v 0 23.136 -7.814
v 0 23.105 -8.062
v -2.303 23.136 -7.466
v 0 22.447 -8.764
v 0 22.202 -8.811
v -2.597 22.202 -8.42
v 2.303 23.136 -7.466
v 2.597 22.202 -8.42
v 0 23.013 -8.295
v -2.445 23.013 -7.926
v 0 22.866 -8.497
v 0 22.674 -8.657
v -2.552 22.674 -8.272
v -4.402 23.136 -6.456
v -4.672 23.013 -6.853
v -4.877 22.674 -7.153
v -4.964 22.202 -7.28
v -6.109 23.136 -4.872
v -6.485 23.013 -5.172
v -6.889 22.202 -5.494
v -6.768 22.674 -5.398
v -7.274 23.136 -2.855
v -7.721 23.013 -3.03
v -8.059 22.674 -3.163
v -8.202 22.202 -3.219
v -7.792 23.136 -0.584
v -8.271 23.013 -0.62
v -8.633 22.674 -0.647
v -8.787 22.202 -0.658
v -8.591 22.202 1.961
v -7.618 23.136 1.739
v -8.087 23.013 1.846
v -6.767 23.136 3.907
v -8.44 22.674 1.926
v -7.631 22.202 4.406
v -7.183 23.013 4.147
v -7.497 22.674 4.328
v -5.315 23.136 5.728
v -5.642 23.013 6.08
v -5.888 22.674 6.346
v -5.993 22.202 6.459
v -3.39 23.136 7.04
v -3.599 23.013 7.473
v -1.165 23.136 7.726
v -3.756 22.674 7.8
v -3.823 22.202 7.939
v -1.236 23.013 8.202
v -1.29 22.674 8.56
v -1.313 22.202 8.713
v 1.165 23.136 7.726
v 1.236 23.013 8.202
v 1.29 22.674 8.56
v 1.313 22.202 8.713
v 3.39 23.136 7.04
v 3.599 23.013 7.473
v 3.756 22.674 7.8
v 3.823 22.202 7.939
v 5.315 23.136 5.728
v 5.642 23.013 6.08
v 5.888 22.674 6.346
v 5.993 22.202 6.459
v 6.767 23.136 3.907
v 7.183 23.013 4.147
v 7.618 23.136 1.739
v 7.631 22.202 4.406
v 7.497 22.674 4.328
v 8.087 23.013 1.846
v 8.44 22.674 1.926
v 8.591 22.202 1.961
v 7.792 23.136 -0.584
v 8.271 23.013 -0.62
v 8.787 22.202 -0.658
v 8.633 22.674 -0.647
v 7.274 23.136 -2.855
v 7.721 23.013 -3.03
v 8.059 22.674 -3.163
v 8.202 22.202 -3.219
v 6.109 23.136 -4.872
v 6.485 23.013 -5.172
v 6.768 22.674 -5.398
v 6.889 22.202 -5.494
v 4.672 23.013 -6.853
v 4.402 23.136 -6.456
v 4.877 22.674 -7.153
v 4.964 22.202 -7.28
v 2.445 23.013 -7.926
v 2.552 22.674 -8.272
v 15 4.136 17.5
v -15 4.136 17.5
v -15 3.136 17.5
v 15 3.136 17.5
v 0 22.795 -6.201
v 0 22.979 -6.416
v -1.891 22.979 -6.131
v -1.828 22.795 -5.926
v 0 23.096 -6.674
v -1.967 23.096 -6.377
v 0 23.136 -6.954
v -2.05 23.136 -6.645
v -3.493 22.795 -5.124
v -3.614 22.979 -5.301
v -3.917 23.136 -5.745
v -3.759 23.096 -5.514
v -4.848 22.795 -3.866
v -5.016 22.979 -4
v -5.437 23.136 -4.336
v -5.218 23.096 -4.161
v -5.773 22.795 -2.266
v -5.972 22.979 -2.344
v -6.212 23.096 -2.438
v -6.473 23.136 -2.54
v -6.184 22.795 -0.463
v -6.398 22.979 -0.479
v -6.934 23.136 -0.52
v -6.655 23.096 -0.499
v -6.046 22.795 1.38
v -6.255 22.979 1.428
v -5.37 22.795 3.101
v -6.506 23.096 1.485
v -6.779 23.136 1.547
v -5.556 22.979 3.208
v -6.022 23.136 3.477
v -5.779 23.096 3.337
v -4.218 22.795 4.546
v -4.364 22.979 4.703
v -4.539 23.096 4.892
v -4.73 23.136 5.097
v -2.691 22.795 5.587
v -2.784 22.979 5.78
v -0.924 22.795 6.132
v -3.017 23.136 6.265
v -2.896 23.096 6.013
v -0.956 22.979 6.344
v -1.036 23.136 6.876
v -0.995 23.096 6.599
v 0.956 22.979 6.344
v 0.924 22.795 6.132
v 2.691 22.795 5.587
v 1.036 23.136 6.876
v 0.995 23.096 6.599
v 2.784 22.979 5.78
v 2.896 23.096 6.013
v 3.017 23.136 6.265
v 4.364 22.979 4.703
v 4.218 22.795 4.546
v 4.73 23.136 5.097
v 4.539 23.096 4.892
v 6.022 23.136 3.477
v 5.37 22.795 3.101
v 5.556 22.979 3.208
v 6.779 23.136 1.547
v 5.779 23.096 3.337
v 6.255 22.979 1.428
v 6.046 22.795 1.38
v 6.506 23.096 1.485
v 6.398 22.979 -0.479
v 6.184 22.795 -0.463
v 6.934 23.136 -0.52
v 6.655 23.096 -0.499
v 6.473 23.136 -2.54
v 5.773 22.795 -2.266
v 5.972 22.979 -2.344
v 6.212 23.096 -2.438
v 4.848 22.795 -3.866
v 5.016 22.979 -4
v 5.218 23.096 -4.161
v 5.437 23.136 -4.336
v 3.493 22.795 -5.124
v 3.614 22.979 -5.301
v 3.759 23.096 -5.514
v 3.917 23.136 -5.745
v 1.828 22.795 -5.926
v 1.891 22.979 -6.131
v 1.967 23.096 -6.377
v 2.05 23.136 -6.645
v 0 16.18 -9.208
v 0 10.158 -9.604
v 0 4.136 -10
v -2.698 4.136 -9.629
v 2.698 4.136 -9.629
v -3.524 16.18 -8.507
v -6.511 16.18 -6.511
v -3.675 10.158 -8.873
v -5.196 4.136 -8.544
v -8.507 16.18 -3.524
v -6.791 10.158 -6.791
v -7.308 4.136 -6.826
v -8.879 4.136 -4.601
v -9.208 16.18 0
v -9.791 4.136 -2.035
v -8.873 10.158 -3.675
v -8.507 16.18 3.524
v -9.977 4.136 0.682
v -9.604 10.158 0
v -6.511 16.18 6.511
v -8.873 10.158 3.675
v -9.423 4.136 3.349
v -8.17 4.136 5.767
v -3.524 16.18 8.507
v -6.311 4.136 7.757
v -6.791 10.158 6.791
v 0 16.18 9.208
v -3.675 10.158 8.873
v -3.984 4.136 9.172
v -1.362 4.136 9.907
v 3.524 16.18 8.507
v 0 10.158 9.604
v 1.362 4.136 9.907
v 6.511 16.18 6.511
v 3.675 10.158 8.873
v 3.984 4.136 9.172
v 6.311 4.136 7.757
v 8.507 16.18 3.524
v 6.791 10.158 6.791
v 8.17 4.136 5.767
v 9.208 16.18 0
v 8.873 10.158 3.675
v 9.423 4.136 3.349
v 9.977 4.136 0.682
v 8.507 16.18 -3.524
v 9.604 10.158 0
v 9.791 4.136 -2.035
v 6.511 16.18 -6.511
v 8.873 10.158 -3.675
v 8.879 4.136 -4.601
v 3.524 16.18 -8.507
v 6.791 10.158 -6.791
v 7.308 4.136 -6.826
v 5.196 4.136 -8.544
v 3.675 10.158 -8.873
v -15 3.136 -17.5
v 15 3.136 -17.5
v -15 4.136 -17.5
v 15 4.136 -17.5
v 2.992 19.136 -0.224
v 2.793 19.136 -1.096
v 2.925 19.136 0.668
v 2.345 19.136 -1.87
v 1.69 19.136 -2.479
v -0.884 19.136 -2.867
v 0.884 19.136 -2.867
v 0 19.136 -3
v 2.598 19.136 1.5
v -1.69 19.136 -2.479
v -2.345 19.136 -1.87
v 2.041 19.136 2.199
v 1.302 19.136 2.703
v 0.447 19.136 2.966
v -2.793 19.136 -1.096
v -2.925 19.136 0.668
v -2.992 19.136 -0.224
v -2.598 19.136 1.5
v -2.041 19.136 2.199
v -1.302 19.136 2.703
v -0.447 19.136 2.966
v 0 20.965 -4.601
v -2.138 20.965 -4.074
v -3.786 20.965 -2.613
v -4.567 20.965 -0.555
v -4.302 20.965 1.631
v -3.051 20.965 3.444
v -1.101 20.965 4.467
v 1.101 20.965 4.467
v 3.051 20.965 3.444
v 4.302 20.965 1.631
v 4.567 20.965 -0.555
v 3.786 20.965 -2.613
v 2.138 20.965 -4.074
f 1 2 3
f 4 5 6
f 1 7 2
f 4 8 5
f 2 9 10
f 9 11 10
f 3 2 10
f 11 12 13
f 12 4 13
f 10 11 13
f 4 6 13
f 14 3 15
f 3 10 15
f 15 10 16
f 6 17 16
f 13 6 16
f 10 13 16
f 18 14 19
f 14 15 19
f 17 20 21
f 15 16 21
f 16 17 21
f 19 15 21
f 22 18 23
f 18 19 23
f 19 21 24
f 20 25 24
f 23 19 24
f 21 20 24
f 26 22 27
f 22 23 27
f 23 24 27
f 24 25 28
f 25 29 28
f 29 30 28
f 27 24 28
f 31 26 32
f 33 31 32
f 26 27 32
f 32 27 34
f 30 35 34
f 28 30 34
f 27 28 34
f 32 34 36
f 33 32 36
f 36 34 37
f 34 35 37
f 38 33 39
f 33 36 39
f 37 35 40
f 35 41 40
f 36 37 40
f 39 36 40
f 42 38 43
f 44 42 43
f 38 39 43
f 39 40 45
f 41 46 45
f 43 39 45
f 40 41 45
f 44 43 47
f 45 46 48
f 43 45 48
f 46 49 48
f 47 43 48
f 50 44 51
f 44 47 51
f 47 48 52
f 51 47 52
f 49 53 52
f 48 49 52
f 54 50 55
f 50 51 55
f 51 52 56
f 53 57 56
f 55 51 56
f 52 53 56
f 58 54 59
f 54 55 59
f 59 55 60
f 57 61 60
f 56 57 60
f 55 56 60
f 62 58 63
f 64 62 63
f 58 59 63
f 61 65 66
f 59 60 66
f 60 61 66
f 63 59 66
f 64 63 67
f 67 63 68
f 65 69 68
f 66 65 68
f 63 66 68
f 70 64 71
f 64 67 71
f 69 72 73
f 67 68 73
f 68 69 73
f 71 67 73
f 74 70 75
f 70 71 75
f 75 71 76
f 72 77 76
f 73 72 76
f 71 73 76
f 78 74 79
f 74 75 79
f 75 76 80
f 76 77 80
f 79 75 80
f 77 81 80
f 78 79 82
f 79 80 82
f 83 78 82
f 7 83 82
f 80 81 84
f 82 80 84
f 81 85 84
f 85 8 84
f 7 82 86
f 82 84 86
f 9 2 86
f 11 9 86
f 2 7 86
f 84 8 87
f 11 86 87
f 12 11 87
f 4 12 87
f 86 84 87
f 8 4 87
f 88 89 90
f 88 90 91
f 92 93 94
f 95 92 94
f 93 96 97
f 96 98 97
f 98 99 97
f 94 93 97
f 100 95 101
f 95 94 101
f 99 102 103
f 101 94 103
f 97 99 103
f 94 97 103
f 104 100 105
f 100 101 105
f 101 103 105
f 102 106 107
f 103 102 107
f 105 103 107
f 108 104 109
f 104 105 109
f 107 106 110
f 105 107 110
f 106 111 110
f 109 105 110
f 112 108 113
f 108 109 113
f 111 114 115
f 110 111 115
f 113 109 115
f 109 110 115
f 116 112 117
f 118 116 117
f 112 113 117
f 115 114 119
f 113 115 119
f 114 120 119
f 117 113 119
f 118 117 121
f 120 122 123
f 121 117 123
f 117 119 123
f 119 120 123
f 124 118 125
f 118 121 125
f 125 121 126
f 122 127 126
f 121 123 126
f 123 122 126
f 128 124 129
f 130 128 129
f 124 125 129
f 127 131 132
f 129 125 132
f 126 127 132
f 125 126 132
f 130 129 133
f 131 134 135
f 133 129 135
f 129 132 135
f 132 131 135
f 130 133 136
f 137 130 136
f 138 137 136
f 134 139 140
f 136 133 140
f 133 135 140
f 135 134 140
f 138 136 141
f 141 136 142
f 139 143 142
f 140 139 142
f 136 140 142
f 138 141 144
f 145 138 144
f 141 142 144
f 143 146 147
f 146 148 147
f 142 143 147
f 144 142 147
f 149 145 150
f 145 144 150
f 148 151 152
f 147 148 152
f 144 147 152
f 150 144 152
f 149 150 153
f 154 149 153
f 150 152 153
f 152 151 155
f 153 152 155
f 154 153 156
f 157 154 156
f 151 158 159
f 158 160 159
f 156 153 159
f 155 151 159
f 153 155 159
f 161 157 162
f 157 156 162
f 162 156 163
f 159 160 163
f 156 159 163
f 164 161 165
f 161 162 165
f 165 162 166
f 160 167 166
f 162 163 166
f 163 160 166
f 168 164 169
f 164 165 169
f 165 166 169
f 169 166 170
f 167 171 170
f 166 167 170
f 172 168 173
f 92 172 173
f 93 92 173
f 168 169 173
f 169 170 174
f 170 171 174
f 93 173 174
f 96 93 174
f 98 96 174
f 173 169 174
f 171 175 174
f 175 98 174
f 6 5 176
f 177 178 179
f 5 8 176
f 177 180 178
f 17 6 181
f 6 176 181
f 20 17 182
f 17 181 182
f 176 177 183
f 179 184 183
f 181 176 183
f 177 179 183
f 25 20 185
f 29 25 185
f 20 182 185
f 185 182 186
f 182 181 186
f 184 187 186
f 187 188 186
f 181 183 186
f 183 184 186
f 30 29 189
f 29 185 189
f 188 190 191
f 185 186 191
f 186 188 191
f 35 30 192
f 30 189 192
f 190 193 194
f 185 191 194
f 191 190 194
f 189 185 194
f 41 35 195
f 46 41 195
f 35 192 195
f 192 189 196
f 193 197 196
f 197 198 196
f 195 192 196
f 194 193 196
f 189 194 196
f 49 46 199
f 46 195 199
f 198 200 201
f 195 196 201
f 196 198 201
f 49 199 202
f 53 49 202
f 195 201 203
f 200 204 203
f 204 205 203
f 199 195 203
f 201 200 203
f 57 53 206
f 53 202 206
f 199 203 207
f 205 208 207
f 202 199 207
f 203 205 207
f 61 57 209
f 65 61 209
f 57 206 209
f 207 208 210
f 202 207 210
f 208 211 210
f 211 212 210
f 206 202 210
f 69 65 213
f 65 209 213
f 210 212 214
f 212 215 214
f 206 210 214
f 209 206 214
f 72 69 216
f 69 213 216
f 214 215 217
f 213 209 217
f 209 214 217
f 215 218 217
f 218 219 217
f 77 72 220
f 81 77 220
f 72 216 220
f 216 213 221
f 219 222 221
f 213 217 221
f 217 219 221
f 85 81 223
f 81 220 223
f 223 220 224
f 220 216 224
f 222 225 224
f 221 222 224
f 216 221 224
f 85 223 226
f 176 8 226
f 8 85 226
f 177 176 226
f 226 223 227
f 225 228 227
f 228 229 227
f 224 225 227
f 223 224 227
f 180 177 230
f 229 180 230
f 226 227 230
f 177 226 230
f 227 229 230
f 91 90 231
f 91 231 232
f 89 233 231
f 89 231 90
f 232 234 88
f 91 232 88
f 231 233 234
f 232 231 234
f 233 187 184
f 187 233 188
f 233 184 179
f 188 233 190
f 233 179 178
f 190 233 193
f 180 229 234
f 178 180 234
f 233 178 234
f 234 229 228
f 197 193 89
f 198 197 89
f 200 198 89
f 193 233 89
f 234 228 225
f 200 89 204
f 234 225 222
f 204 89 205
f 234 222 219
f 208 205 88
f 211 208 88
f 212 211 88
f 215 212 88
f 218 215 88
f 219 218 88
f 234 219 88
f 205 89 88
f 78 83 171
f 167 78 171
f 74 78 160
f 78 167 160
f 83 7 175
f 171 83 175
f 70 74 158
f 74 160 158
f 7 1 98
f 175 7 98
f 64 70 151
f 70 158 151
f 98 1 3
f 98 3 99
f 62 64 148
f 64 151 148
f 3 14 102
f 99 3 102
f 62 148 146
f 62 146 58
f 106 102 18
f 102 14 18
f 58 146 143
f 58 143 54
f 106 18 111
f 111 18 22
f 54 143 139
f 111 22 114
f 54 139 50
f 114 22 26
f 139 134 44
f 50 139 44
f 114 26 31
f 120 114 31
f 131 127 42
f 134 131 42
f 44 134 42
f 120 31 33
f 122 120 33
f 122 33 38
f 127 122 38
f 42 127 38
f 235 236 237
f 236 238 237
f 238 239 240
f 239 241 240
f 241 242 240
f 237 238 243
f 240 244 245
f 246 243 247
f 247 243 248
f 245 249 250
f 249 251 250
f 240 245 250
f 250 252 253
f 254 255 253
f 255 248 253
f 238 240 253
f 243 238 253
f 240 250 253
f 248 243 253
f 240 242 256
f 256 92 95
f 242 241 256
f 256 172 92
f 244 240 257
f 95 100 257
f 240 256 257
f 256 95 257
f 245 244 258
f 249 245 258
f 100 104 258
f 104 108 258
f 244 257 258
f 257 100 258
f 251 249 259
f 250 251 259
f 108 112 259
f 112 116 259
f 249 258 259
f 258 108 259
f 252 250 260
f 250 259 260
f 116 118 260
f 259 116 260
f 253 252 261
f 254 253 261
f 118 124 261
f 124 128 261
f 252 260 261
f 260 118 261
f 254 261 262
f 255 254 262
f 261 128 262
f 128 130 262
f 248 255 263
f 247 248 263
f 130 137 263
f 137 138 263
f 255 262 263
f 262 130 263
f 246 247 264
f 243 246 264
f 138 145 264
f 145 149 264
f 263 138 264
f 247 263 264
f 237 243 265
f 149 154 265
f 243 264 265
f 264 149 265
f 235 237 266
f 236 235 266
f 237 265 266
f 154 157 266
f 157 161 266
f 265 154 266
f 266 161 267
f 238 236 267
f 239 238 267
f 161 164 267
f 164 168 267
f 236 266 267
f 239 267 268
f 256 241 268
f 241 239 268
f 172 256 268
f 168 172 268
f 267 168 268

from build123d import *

# Parameters (mm, degrees)
CONG_1_R           = 1
ESQUISSE2_W        = 30
ESQUISSE2_H        = 35
BOSS_EXTRU_1_DEPTH = 1


with BuildPart() as part:
    # Esquisse1 → Révolution1 (revolve)
    with BuildSketch(Plane.XY, mode=Mode.PRIVATE) as r_volution1_sk:
        Polygon((0, 19.136127235), (3, 19.136127235), (6.5, 23.136127235), (8.75, 23.136127235), (10, 4.136127235), (0, 4.136127235), align=None)
    revolve(r_volution1_sk.sketch.rotate(Axis((0, 0, 0), (0, 1, 0)), 90), axis=Axis((0, 0, 0), (0, 1, 0)))

    # Congé1
    cong_1_edges = [part.edges().sort_by_distance(p)[0] for p in [
        (0, 23.136127235, 8.75),
        (0, 23.136127235, 6.5),
    ]]
    fillet(cong_1_edges, radius=CONG_1_R)

    # Esquisse2 → Boss.-Extru.1 (add)
    with BuildSketch(Plane.XZ.offset(-4.136127235)):
        Rectangle(ESQUISSE2_W, ESQUISSE2_H)
    extrude(amount=BOSS_EXTRU_1_DEPTH)


solid = part.part
